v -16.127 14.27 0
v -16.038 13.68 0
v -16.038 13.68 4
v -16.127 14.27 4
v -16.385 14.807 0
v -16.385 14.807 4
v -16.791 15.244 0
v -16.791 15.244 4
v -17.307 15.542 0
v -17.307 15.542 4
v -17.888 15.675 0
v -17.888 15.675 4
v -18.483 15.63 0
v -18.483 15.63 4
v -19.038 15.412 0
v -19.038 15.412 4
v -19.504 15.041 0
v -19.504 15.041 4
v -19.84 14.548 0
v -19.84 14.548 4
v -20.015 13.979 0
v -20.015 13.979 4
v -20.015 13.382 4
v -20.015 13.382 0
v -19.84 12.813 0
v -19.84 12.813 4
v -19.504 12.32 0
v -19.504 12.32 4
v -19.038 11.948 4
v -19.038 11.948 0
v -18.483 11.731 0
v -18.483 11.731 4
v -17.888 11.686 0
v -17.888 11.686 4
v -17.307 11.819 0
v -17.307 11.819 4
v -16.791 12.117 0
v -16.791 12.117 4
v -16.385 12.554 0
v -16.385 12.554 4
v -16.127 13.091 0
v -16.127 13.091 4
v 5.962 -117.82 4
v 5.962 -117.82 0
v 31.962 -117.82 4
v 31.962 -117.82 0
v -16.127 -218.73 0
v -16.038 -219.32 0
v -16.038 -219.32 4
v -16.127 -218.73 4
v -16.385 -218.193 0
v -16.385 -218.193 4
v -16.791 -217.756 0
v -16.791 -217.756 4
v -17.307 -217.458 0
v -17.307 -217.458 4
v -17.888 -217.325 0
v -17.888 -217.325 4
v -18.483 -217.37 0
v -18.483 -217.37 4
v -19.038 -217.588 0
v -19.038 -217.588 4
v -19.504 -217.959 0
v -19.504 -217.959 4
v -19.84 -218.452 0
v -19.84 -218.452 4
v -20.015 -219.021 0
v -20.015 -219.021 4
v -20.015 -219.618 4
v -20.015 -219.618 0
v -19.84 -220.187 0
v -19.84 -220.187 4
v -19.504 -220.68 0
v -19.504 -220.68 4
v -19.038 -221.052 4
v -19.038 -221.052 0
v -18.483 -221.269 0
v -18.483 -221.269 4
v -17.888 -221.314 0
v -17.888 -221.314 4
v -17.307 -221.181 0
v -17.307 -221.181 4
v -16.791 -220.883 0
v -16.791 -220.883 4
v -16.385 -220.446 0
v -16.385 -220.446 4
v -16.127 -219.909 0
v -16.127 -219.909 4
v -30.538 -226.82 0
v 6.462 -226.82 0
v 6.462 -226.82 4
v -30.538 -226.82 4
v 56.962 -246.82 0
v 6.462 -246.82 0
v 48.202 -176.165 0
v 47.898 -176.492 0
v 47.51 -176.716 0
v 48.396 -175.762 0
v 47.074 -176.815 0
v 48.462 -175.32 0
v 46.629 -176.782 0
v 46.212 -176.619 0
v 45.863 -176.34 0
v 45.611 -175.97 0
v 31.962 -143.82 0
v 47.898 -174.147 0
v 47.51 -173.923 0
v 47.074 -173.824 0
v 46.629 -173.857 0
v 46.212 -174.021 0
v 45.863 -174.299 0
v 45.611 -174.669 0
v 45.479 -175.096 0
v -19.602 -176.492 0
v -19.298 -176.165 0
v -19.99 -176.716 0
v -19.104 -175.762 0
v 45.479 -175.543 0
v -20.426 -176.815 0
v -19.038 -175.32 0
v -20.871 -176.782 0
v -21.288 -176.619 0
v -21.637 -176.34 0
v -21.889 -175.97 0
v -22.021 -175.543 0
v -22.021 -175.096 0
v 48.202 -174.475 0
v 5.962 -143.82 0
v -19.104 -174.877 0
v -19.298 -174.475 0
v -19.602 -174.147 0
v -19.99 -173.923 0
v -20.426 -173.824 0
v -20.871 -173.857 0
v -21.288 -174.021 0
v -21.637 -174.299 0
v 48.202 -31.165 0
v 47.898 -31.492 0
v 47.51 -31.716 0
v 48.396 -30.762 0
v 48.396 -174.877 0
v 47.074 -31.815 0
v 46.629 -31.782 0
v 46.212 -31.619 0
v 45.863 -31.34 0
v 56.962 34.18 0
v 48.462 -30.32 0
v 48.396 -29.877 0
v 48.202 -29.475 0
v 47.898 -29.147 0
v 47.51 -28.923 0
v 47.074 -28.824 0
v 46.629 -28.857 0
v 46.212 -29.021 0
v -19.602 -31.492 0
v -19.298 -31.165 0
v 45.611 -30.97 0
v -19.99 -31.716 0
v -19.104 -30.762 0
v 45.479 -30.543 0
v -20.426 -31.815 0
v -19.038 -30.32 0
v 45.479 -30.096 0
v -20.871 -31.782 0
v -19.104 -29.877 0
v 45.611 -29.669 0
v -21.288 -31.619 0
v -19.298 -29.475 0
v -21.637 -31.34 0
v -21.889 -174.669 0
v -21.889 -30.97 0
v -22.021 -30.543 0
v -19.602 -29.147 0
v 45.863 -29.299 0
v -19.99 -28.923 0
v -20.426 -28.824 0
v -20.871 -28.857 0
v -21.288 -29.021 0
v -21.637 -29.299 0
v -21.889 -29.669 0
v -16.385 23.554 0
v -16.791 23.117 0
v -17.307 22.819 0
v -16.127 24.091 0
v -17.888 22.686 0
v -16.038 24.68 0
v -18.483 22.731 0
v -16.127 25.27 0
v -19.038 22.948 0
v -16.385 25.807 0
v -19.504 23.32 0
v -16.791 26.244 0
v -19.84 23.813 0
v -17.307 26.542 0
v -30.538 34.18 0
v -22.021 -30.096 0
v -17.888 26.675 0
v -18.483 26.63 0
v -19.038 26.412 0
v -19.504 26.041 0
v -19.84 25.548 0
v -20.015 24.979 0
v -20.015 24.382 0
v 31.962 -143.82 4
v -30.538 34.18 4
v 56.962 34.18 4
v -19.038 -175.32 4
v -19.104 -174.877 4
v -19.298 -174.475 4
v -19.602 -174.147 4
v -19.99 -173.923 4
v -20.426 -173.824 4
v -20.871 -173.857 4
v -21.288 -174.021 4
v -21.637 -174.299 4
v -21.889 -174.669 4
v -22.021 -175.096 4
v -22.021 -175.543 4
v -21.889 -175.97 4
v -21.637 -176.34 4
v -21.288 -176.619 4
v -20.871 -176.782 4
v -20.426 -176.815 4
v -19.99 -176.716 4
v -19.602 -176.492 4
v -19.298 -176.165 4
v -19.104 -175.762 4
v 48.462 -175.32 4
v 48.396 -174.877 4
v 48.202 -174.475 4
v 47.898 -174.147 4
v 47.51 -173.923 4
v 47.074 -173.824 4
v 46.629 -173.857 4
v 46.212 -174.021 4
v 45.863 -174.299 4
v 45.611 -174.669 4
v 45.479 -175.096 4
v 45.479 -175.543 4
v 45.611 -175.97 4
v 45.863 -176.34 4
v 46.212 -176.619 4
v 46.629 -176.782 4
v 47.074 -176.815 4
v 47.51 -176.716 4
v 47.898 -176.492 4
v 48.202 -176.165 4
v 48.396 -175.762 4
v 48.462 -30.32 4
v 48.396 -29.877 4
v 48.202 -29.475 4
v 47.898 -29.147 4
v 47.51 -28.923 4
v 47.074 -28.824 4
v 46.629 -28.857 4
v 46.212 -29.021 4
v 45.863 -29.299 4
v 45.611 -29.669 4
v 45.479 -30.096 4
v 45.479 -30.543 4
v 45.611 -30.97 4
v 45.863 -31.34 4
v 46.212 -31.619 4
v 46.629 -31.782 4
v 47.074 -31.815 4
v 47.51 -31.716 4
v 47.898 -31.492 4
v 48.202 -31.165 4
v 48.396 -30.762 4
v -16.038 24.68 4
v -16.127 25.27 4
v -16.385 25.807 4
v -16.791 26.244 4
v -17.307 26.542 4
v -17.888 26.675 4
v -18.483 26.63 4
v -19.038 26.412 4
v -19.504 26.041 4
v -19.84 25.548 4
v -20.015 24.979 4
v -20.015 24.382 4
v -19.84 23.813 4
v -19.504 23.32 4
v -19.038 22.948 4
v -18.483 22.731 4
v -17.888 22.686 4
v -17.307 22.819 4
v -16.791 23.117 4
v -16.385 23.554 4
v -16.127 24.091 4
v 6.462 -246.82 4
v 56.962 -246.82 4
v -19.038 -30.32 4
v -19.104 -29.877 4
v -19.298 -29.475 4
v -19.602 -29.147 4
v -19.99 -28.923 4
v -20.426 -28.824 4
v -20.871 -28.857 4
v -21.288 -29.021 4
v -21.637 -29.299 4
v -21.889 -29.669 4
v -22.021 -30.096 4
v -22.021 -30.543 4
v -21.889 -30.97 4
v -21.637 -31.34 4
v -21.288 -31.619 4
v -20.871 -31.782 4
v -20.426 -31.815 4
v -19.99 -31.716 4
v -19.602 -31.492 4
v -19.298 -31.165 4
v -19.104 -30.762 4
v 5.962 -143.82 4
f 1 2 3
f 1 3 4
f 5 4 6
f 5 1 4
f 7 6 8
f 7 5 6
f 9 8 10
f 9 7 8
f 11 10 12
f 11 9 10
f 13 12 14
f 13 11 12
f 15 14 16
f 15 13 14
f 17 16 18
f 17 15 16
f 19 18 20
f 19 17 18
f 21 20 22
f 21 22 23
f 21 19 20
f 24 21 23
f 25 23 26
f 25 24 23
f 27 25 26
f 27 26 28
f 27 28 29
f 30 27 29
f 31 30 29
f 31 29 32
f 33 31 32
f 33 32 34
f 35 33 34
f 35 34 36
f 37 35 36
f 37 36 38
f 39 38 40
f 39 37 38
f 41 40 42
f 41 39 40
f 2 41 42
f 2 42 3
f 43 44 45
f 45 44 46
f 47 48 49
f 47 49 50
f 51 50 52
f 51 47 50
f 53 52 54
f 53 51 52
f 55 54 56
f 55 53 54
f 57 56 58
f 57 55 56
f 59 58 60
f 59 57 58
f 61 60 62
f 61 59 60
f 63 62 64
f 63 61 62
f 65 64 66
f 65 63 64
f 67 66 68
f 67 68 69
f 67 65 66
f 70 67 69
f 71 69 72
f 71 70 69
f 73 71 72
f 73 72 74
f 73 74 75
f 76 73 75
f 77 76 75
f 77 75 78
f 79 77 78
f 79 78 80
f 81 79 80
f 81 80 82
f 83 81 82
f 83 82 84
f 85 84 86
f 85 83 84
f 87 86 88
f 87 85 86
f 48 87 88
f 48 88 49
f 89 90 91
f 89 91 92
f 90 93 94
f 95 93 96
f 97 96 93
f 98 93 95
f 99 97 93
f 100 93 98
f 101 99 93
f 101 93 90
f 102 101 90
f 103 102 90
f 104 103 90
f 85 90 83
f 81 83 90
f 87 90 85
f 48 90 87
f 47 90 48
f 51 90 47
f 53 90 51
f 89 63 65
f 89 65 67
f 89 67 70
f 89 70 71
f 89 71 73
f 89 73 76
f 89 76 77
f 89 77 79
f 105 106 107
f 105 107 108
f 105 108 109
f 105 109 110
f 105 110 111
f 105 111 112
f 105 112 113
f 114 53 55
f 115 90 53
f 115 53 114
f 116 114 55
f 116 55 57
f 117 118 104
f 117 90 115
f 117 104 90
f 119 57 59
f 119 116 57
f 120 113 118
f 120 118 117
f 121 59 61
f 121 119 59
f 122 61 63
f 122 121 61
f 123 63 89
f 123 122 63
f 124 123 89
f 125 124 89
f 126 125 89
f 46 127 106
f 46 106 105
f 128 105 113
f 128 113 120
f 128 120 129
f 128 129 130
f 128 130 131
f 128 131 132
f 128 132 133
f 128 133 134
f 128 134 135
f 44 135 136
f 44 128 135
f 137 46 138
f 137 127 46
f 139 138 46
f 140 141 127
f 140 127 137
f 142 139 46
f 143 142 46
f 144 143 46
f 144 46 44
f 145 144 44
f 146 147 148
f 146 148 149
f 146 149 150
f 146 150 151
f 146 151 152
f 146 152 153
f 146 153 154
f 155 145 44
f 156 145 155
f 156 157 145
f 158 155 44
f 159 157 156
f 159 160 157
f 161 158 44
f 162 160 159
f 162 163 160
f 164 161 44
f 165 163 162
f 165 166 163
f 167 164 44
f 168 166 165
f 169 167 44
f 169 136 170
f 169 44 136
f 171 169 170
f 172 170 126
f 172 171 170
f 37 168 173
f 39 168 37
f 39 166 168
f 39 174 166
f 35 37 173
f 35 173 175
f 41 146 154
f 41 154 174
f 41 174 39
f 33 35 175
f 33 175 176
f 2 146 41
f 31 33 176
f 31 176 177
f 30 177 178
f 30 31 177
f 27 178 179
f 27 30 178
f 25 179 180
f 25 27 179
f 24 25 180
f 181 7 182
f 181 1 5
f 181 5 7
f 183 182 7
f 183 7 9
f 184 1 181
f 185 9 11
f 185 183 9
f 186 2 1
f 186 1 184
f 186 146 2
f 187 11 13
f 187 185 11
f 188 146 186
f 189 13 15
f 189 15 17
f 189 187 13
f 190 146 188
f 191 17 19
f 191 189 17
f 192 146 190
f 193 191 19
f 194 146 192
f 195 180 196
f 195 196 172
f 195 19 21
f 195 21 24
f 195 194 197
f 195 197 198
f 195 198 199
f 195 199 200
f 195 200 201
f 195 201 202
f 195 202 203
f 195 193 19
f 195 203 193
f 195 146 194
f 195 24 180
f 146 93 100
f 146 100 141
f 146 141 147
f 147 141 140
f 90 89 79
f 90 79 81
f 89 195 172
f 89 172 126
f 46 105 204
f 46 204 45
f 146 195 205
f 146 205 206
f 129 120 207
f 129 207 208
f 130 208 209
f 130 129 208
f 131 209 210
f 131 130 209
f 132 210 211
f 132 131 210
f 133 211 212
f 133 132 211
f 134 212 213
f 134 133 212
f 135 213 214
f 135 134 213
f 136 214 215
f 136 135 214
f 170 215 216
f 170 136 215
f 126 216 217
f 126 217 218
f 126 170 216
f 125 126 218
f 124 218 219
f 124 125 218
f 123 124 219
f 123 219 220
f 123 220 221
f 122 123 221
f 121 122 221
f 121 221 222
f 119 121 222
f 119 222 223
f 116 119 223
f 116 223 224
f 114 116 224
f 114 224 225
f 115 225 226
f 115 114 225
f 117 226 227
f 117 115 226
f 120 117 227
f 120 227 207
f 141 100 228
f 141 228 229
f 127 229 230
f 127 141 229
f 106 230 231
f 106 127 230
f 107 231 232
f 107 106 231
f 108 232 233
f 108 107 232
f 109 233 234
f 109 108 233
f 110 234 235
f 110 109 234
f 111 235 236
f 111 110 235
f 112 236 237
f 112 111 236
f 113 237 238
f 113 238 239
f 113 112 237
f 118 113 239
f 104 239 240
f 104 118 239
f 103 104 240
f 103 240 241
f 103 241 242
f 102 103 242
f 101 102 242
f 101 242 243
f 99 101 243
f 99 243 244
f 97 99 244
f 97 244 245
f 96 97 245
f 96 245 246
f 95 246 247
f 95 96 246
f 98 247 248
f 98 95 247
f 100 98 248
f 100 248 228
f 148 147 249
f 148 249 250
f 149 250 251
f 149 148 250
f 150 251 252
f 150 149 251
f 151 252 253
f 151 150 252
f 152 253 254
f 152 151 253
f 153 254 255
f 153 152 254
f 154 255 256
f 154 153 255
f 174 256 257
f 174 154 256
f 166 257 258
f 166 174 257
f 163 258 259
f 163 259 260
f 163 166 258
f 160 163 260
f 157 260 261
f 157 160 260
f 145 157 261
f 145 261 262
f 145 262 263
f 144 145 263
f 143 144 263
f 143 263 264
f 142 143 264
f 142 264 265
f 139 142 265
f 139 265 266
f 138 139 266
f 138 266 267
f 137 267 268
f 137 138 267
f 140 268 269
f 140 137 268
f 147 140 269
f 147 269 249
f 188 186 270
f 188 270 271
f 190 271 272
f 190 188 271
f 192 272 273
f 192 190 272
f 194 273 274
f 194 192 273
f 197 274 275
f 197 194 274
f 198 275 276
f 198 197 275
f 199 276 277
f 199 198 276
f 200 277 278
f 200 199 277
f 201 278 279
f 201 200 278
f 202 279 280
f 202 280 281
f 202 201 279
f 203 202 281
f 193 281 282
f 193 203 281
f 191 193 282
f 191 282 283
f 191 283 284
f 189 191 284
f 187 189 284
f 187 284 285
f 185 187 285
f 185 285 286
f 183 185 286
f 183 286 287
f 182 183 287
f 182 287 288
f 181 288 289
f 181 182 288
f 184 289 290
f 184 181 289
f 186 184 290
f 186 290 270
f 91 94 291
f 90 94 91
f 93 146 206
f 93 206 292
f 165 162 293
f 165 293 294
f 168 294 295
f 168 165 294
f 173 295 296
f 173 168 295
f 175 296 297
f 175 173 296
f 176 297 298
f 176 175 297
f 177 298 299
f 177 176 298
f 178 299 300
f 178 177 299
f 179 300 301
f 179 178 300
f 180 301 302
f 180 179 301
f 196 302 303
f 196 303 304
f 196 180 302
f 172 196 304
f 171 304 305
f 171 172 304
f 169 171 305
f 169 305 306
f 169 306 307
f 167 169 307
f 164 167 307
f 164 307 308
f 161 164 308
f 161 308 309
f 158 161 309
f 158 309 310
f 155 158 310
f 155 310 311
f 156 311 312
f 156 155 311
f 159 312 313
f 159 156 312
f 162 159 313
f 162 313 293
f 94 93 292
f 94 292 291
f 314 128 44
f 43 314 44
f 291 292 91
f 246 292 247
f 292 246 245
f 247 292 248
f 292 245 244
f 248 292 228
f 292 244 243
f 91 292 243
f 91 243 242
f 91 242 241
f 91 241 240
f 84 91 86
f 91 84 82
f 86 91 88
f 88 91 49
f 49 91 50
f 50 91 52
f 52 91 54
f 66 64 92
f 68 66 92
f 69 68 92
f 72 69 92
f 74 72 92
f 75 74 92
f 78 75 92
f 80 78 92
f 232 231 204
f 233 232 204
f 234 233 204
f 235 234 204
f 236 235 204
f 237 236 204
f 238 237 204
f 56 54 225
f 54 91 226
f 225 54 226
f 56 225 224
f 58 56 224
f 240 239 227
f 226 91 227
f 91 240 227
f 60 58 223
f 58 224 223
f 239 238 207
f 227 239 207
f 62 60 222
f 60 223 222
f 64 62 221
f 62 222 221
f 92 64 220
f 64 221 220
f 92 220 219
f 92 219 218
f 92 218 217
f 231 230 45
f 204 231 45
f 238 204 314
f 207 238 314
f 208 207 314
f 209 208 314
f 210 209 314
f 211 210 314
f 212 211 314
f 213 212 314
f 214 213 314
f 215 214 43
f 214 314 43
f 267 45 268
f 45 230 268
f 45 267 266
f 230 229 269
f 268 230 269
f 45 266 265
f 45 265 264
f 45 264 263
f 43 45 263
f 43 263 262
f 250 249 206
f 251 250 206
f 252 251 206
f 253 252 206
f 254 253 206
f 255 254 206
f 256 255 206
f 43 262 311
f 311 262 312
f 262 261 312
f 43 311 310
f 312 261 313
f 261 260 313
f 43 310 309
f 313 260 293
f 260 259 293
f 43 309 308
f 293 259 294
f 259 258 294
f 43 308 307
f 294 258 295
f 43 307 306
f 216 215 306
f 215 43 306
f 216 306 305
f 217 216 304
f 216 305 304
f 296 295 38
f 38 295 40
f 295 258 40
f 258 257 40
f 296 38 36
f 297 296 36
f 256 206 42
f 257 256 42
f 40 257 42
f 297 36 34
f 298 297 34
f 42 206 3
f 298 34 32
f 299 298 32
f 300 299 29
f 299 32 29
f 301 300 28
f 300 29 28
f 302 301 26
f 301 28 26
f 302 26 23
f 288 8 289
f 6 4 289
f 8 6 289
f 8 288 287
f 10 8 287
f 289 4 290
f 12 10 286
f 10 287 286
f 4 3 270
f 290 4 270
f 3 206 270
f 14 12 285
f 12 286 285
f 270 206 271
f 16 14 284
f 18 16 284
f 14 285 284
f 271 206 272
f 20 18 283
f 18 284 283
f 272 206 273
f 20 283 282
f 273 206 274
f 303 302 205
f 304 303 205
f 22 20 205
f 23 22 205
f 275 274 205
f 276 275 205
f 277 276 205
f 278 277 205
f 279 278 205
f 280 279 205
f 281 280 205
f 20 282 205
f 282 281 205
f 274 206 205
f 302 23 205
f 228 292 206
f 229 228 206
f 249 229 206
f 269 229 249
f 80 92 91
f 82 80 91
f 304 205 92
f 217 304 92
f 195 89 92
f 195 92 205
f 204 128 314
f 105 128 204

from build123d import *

# Parameters (mm, degrees)
ESQUISSE1_R      = 1.5
ESQUISSE1_R_2    = 2
ESQUISSE1_W      = 26
ESQUISSE1_H      = 26
EXTRUSION1_DEPTH = 4


with BuildPart() as part:
    # Esquisse1 → Extrusion1 (new body)
    with BuildSketch(Plane.XY):
        Polygon((-30.537686248, 34.180421053), (56.962313752, 34.180421053), (56.962313752, -246.819578947), (6.462313752, -246.819578947), (6.462313752, -226.819578947), (-30.537686248, -226.819578947), align=None)
        with Locations((-20.537686248, -175.319578947)):
            Circle(ESQUISSE1_R, mode=Mode.SUBTRACT)
        with Locations((-20.537686248, -30.319578947)):
            Circle(ESQUISSE1_R, mode=Mode.SUBTRACT)
        with Locations((46.962313752, -30.319578947)):
            Circle(ESQUISSE1_R, mode=Mode.SUBTRACT)
        with Locations((46.962313752, -175.319578947)):
            Circle(ESQUISSE1_R, mode=Mode.SUBTRACT)
        with Locations((-18.037686248, -219.319578947)):
            Circle(ESQUISSE1_R_2, mode=Mode.SUBTRACT)
        with Locations((-18.037686248, 24.680421053)):
            Circle(ESQUISSE1_R_2, mode=Mode.SUBTRACT)
        with Locations((-18.037686248, 13.680421053)):
            Circle(ESQUISSE1_R_2, mode=Mode.SUBTRACT)
        with Locations((18.962313752, -130.819578947)):
            Rectangle(ESQUISSE1_W, ESQUISSE1_H, mode=Mode.SUBTRACT)
    extrude(amount=EXTRUSION1_DEPTH)


solid = part.part
